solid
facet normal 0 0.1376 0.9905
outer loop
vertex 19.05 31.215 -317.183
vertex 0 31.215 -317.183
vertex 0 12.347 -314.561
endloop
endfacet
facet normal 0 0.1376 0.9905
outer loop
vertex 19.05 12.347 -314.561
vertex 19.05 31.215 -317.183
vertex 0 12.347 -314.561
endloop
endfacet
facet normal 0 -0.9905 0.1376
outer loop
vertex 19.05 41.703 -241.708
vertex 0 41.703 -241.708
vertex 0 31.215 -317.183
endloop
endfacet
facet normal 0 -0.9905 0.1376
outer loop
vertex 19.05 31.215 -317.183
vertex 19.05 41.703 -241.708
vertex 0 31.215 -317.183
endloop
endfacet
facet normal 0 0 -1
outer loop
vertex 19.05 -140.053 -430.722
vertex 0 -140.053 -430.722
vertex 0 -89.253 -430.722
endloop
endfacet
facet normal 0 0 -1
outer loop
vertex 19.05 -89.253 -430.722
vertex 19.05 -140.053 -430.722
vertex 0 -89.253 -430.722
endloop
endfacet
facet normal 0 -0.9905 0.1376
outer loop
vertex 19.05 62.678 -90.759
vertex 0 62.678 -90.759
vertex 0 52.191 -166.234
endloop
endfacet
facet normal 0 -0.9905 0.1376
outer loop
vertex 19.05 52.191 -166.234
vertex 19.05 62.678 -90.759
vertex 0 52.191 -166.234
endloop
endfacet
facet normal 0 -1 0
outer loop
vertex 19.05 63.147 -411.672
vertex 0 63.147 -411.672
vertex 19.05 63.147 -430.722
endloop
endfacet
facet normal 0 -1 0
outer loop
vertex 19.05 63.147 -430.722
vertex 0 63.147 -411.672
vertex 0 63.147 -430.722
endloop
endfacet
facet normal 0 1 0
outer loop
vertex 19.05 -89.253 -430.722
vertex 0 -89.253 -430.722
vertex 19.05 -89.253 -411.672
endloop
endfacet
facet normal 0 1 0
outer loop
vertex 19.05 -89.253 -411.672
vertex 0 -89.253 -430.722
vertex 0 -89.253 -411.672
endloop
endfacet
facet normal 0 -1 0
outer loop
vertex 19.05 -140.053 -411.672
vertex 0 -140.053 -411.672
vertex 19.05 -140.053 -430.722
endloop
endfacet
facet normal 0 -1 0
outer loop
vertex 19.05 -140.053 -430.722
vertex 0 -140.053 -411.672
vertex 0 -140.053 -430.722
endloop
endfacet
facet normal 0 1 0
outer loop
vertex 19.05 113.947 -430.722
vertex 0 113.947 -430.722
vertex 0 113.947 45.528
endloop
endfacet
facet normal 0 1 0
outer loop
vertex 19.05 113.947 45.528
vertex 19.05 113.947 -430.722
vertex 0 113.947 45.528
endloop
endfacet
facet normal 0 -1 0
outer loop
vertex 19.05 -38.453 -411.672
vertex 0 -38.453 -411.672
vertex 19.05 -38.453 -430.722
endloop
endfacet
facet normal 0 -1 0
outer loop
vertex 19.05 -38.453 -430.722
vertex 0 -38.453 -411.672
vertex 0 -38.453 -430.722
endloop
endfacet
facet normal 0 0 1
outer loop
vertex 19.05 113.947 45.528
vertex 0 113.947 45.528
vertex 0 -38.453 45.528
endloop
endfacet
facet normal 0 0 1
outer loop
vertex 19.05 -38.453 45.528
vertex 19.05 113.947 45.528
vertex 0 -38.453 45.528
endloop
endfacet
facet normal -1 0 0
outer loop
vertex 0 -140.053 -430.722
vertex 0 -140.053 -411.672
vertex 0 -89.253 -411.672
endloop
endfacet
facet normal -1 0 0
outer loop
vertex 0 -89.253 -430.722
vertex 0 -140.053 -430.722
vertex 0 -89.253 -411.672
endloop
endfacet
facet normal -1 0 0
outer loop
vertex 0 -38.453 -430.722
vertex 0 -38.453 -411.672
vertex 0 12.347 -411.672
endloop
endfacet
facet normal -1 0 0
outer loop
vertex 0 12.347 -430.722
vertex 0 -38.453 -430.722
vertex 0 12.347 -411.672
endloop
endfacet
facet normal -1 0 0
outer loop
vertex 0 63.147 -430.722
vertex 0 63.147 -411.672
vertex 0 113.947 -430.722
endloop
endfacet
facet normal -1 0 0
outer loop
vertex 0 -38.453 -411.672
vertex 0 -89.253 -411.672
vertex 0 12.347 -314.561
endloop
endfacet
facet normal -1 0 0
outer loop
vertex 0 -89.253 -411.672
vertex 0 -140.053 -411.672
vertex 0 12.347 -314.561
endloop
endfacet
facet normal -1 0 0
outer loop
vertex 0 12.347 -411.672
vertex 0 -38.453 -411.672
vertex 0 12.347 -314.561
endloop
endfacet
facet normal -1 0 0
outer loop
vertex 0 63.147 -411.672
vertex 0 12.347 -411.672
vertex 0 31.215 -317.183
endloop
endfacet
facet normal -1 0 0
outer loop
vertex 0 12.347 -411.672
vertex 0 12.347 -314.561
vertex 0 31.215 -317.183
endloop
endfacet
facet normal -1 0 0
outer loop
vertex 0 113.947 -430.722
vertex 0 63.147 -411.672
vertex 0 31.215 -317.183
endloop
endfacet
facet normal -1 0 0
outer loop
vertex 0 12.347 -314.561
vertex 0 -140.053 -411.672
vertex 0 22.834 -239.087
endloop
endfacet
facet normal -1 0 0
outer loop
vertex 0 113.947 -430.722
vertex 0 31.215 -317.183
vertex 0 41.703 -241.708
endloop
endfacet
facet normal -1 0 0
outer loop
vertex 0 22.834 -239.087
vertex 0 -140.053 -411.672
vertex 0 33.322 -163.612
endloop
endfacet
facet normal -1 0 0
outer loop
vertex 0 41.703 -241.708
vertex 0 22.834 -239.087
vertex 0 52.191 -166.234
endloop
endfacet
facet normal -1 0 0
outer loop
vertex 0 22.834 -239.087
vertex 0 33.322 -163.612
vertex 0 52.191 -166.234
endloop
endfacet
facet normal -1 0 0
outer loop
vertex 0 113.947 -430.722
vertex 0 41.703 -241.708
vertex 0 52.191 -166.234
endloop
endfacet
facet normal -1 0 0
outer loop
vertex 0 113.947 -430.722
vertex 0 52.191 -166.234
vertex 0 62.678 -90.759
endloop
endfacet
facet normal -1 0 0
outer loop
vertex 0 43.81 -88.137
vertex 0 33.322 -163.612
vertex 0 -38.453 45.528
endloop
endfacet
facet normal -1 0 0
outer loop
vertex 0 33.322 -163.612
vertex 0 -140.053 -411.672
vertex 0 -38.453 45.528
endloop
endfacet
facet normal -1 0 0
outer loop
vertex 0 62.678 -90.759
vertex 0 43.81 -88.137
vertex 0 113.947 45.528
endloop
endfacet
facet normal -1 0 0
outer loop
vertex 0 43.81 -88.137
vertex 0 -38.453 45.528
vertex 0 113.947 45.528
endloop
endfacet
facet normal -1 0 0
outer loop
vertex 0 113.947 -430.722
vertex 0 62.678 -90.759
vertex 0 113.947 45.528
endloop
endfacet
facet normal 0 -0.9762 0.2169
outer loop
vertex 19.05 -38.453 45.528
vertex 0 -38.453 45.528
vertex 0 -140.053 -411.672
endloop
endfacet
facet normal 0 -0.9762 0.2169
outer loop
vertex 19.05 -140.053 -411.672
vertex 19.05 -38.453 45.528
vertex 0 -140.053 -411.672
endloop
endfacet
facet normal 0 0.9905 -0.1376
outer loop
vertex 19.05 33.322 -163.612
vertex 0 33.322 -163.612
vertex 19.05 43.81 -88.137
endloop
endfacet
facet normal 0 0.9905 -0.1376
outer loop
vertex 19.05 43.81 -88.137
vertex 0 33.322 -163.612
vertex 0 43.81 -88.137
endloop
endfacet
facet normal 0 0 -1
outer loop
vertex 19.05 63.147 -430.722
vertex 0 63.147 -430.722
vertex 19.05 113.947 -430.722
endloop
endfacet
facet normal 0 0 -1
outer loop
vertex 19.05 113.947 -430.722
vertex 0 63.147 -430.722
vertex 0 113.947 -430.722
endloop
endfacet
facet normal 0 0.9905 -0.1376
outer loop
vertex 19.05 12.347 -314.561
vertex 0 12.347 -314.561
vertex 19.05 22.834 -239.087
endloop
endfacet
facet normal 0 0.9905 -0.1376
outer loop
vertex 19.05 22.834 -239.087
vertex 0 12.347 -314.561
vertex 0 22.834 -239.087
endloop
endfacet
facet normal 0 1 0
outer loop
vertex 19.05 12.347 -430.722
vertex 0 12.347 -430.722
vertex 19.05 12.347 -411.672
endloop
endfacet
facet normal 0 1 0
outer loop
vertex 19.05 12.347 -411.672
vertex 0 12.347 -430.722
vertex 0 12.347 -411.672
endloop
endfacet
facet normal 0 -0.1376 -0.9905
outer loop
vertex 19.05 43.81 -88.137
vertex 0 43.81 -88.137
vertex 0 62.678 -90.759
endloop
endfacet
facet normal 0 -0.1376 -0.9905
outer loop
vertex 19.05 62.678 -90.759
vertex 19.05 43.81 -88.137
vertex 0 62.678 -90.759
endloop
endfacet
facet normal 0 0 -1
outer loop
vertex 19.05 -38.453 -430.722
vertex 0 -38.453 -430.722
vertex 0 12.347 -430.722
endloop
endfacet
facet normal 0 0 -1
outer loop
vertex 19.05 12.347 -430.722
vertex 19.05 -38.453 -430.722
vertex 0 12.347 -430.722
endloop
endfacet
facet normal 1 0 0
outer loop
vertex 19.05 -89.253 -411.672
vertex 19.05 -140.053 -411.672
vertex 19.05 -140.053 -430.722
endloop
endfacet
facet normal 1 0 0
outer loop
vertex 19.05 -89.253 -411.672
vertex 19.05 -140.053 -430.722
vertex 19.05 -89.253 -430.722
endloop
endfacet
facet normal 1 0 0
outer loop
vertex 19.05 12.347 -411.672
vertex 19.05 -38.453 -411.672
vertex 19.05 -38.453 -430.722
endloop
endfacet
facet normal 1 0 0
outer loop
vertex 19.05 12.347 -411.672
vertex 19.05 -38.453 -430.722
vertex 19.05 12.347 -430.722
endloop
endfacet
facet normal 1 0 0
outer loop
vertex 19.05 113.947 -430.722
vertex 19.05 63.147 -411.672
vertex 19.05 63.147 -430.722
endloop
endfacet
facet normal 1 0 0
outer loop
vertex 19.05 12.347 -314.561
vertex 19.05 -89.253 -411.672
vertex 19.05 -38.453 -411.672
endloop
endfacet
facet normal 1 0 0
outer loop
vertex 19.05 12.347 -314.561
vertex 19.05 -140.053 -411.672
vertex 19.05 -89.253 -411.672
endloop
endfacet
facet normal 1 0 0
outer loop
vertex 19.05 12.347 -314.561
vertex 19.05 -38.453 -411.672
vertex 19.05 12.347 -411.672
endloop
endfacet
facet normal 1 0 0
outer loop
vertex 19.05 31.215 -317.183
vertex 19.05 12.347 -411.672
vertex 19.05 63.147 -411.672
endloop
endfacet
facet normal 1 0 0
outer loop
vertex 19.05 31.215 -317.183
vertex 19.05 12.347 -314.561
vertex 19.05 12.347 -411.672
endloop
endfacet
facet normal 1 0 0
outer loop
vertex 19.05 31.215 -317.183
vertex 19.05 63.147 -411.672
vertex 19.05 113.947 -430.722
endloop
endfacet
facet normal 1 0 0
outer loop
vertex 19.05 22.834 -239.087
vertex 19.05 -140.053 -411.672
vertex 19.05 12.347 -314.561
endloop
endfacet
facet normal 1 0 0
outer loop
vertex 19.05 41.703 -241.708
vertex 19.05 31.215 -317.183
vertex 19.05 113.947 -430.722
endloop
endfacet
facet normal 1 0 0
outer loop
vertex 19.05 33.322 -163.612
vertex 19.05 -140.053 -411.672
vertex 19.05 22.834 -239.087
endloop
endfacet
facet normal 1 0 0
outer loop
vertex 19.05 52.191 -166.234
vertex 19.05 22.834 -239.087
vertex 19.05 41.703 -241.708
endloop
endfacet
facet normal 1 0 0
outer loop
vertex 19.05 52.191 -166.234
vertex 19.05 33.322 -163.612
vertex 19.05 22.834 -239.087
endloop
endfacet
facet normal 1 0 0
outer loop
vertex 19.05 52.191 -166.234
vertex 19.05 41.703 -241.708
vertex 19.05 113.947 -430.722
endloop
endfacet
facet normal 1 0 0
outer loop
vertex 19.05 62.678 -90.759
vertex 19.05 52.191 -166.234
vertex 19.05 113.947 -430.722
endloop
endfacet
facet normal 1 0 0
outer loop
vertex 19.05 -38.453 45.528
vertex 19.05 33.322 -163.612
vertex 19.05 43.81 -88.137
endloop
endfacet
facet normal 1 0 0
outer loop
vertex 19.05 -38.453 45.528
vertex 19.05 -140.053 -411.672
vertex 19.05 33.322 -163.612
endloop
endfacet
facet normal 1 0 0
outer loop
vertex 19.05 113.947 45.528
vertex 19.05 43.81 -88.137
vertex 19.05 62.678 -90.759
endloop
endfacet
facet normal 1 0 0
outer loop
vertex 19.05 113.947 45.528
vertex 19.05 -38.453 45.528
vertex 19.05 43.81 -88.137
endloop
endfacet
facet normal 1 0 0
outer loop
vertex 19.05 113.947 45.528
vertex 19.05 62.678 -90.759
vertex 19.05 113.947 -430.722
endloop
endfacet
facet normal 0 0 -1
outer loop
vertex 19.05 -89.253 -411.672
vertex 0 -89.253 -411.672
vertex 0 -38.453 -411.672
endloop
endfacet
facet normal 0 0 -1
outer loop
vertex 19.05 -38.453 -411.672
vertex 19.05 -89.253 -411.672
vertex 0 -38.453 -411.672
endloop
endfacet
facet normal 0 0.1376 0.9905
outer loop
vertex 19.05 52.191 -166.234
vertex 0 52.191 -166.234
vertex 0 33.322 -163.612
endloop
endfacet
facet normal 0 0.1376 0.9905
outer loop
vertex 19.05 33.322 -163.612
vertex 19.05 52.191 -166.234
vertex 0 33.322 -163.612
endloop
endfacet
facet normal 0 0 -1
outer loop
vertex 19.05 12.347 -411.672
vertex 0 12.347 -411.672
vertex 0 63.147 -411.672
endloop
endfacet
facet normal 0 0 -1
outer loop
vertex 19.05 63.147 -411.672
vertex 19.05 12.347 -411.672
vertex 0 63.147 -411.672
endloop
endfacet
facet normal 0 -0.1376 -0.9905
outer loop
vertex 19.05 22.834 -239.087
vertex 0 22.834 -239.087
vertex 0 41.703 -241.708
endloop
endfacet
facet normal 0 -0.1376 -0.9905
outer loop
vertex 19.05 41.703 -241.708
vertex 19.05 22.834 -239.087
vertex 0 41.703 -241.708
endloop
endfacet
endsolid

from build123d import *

# Parameters (mm, degrees)
F1_DEPTH = 19.05
F2_DEPTH = 19.05


with BuildPart() as f1:
    # F0 (on Right) → F1 (new body)
    with BuildSketch(Plane.YZ):
        Polygon((113.946683, 45.527574), (-38.453317, 45.527574), (-140.053317, -411.672426), (-140.053317, -430.722426), (-89.253317, -430.722426), (-89.253317, -411.672426), (-38.453317, -411.672426), (-38.453317, -430.722426), (12.346683, -430.722426), (12.346683, -411.672426), (63.146683, -411.672426), (63.146683, -430.722426), (113.946683, -430.722426), (113.946683, -411.672426), (113.946683, -335.472426), (113.946683, -259.272426), (113.946683, -183.072426), (113.946683, -106.872426), (113.946683, -30.672426), align=None)
        Polygon((22.834336, -239.086572), (41.703042, -241.708486), (31.215389, -317.18331), (12.346683, -314.561397), align=None, mode=Mode.SUBTRACT)
        Polygon((43.809643, -88.136923), (62.678349, -90.758837), (52.190696, -166.233661), (33.32199, -163.611748), align=None, mode=Mode.SUBTRACT)
    extrude(amount=F1_DEPTH)

    # F0 (on Right) → F2 (join)
    with BuildSketch(Plane.YZ):
        Polygon((113.946683, 45.527574), (-38.453317, 45.527574), (-140.053317, -411.672426), (-140.053317, -430.722426), (-89.253317, -430.722426), (-89.253317, -411.672426), (-38.453317, -411.672426), (-38.453317, -430.722426), (12.346683, -430.722426), (12.346683, -411.672426), (63.146683, -411.672426), (63.146683, -430.722426), (113.946683, -430.722426), (113.946683, -411.672426), (113.946683, -335.472426), (113.946683, -259.272426), (113.946683, -183.072426), (113.946683, -106.872426), (113.946683, -30.672426), align=None)
        Polygon((22.834336, -239.086572), (41.703042, -241.708486), (31.215389, -317.18331), (12.346683, -314.561397), align=None, mode=Mode.SUBTRACT)
        Polygon((43.809643, -88.136923), (62.678349, -90.758837), (52.190696, -166.233661), (33.32199, -163.611748), align=None, mode=Mode.SUBTRACT)
    extrude(amount=F2_DEPTH)


solid = f1.part
